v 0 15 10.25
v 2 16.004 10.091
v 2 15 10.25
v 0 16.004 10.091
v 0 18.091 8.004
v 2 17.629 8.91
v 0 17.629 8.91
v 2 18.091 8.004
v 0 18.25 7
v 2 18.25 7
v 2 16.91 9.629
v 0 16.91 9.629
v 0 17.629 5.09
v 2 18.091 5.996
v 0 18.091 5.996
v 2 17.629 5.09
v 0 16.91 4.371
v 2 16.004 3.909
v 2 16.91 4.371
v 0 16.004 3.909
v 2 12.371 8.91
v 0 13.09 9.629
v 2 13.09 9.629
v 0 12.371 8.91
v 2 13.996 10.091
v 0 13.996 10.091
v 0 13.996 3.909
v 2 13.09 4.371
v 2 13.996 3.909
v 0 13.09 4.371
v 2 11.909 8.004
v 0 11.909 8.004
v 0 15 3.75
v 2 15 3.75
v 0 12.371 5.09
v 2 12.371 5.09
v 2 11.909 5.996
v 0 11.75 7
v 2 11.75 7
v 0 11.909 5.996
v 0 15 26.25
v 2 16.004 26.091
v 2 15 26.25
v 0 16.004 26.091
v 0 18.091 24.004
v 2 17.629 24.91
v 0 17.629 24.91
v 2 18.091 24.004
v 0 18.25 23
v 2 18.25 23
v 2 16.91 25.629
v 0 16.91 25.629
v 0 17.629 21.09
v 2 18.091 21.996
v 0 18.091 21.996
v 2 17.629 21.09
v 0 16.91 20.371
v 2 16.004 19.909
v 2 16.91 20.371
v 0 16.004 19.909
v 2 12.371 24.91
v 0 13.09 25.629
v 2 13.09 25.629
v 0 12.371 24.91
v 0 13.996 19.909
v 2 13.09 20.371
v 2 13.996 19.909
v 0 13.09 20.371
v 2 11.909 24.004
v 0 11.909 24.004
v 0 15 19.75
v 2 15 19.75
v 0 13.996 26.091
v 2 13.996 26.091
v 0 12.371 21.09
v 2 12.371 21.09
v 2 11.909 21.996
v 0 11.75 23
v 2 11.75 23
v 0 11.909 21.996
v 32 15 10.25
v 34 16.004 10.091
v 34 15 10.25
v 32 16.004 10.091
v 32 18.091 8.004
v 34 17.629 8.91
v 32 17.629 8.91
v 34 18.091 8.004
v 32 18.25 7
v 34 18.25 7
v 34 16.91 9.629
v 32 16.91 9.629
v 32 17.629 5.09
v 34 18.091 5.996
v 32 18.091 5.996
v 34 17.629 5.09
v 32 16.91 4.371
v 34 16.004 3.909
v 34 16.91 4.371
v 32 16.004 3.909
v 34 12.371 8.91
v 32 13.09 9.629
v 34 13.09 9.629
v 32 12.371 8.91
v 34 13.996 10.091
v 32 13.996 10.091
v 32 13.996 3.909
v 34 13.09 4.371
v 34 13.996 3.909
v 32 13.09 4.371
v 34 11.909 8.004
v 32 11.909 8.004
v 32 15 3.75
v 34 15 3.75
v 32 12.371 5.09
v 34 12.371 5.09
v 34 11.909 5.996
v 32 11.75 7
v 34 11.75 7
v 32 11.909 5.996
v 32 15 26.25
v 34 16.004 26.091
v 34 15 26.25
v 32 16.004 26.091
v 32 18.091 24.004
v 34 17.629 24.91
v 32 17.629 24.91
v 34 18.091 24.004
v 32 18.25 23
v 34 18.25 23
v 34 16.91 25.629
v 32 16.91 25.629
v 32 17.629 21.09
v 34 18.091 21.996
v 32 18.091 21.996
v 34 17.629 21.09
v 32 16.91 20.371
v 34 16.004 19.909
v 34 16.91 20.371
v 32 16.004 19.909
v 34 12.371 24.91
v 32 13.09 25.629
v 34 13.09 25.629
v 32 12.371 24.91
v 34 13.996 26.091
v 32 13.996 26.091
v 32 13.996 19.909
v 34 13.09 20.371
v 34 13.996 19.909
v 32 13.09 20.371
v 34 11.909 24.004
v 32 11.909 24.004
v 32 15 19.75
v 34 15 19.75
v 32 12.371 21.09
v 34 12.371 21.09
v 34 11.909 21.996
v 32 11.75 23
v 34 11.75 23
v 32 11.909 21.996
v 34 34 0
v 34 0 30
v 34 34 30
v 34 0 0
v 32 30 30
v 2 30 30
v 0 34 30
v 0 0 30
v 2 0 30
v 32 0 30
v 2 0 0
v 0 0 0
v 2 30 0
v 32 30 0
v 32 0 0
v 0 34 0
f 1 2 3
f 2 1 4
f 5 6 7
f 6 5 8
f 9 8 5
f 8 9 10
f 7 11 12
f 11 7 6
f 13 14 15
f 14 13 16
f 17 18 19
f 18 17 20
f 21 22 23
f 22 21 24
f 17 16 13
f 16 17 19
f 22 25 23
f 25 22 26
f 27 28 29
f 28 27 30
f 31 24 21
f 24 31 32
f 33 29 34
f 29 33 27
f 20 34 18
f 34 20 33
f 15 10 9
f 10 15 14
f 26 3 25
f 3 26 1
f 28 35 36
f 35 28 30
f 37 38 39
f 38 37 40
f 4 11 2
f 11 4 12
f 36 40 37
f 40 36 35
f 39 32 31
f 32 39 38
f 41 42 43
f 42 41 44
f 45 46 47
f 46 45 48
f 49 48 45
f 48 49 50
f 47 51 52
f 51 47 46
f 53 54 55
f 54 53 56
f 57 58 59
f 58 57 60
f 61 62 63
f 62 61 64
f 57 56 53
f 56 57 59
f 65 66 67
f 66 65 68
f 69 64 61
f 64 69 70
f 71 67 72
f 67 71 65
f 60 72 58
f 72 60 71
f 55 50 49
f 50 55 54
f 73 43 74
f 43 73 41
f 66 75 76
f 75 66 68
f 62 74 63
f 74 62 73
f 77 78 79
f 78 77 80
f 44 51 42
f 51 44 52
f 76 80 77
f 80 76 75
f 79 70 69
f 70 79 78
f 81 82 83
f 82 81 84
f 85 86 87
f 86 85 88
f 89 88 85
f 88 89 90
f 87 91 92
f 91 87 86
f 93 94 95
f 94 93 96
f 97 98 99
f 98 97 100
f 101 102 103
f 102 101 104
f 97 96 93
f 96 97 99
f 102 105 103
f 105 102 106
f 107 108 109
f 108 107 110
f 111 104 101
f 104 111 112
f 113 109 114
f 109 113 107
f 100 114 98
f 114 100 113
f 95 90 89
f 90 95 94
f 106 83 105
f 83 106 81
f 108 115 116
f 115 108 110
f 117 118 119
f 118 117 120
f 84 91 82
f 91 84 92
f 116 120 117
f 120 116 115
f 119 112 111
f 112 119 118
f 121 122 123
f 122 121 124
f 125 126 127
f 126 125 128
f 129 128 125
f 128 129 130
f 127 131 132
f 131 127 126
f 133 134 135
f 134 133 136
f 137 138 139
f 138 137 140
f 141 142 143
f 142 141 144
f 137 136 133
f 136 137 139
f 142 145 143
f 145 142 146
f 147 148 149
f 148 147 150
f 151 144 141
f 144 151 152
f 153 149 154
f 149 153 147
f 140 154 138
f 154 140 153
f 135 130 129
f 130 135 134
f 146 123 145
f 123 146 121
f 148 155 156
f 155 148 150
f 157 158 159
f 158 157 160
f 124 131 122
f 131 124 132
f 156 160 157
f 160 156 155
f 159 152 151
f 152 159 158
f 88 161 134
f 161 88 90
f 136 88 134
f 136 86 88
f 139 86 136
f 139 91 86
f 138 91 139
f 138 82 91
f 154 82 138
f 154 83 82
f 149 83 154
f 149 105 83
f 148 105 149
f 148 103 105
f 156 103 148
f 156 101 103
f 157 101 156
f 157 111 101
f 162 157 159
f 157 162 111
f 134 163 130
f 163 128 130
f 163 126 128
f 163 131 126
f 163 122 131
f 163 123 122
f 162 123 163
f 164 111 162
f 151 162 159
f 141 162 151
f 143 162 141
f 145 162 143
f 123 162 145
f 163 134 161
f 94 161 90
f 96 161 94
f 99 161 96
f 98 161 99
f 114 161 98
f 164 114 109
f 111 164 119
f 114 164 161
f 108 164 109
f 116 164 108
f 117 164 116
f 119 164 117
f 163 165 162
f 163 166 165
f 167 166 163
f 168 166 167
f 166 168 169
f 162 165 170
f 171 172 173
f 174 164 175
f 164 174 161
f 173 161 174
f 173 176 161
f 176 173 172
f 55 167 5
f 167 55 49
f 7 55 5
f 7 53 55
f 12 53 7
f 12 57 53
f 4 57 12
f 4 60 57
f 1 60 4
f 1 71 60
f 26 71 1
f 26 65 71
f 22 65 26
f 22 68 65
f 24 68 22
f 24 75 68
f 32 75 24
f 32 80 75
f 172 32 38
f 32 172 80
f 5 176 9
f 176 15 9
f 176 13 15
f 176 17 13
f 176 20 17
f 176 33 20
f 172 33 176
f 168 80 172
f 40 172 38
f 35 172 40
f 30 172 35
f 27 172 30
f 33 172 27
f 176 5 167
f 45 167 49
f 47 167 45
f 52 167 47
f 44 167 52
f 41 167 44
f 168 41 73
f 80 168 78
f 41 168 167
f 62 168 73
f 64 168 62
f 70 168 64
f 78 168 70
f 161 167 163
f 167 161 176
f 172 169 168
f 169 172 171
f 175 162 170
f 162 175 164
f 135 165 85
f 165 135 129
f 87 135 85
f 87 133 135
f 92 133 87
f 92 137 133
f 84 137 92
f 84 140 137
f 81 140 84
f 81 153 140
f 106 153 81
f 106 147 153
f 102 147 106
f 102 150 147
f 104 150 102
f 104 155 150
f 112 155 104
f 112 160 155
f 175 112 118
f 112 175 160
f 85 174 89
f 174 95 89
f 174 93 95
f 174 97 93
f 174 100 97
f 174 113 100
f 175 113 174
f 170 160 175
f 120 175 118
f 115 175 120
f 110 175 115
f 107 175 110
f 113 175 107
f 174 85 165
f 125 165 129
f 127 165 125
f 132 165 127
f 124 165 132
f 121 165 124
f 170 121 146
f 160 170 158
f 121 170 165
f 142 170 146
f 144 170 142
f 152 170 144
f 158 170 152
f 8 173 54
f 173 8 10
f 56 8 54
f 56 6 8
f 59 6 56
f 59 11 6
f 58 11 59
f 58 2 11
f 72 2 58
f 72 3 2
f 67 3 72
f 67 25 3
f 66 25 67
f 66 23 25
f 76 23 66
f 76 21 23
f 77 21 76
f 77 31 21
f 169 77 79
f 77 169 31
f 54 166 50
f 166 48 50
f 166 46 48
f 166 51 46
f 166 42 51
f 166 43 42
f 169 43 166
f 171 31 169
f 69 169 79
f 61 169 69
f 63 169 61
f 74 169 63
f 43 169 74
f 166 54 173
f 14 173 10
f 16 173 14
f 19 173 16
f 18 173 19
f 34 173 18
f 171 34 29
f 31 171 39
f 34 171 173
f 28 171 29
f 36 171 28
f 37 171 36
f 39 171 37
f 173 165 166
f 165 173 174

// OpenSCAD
include <../../parameters.scad>



module ALU_profile_holder_side() {
    wall_thickness = ALU_profile_holder_wall_thickness;
    
    //díry na přišroubování k Al profilům
    module screws_holes(diameter) {
        translate([0, 0, 7])
            rotate([90, 0, 90])
                cylinder(d=diameter, h=wall_thickness*2, center=true, $fn=20);
        
        translate([0, 0, strain_gauge_screw_distance+13])
            rotate([90, 0, 90])
                cylinder(d=diameter, h=wall_thickness*2, center=true, $fn=20);
    }
    
    difference() {
        cube([ALU_profile_width+wall_thickness*2, ALU_profile_width+wall_thickness*2, strain_gauge_screw_distance+20]);

        translate([wall_thickness, 0, 0])
        cube([ALU_profile_width, ALU_profile_width, strain_gauge_screw_distance+20]);
        
        translate([wall_thickness*0.5, ALU_profile_width/2, 0]) {
                screws_holes(M6_screw_diameter);
                translate([ALU_profile_width+wall_thickness, 0, 0]) {
                    screws_holes(M6_screw_diameter);
                }
        }
    }
}

ALU_profile_holder_side();
